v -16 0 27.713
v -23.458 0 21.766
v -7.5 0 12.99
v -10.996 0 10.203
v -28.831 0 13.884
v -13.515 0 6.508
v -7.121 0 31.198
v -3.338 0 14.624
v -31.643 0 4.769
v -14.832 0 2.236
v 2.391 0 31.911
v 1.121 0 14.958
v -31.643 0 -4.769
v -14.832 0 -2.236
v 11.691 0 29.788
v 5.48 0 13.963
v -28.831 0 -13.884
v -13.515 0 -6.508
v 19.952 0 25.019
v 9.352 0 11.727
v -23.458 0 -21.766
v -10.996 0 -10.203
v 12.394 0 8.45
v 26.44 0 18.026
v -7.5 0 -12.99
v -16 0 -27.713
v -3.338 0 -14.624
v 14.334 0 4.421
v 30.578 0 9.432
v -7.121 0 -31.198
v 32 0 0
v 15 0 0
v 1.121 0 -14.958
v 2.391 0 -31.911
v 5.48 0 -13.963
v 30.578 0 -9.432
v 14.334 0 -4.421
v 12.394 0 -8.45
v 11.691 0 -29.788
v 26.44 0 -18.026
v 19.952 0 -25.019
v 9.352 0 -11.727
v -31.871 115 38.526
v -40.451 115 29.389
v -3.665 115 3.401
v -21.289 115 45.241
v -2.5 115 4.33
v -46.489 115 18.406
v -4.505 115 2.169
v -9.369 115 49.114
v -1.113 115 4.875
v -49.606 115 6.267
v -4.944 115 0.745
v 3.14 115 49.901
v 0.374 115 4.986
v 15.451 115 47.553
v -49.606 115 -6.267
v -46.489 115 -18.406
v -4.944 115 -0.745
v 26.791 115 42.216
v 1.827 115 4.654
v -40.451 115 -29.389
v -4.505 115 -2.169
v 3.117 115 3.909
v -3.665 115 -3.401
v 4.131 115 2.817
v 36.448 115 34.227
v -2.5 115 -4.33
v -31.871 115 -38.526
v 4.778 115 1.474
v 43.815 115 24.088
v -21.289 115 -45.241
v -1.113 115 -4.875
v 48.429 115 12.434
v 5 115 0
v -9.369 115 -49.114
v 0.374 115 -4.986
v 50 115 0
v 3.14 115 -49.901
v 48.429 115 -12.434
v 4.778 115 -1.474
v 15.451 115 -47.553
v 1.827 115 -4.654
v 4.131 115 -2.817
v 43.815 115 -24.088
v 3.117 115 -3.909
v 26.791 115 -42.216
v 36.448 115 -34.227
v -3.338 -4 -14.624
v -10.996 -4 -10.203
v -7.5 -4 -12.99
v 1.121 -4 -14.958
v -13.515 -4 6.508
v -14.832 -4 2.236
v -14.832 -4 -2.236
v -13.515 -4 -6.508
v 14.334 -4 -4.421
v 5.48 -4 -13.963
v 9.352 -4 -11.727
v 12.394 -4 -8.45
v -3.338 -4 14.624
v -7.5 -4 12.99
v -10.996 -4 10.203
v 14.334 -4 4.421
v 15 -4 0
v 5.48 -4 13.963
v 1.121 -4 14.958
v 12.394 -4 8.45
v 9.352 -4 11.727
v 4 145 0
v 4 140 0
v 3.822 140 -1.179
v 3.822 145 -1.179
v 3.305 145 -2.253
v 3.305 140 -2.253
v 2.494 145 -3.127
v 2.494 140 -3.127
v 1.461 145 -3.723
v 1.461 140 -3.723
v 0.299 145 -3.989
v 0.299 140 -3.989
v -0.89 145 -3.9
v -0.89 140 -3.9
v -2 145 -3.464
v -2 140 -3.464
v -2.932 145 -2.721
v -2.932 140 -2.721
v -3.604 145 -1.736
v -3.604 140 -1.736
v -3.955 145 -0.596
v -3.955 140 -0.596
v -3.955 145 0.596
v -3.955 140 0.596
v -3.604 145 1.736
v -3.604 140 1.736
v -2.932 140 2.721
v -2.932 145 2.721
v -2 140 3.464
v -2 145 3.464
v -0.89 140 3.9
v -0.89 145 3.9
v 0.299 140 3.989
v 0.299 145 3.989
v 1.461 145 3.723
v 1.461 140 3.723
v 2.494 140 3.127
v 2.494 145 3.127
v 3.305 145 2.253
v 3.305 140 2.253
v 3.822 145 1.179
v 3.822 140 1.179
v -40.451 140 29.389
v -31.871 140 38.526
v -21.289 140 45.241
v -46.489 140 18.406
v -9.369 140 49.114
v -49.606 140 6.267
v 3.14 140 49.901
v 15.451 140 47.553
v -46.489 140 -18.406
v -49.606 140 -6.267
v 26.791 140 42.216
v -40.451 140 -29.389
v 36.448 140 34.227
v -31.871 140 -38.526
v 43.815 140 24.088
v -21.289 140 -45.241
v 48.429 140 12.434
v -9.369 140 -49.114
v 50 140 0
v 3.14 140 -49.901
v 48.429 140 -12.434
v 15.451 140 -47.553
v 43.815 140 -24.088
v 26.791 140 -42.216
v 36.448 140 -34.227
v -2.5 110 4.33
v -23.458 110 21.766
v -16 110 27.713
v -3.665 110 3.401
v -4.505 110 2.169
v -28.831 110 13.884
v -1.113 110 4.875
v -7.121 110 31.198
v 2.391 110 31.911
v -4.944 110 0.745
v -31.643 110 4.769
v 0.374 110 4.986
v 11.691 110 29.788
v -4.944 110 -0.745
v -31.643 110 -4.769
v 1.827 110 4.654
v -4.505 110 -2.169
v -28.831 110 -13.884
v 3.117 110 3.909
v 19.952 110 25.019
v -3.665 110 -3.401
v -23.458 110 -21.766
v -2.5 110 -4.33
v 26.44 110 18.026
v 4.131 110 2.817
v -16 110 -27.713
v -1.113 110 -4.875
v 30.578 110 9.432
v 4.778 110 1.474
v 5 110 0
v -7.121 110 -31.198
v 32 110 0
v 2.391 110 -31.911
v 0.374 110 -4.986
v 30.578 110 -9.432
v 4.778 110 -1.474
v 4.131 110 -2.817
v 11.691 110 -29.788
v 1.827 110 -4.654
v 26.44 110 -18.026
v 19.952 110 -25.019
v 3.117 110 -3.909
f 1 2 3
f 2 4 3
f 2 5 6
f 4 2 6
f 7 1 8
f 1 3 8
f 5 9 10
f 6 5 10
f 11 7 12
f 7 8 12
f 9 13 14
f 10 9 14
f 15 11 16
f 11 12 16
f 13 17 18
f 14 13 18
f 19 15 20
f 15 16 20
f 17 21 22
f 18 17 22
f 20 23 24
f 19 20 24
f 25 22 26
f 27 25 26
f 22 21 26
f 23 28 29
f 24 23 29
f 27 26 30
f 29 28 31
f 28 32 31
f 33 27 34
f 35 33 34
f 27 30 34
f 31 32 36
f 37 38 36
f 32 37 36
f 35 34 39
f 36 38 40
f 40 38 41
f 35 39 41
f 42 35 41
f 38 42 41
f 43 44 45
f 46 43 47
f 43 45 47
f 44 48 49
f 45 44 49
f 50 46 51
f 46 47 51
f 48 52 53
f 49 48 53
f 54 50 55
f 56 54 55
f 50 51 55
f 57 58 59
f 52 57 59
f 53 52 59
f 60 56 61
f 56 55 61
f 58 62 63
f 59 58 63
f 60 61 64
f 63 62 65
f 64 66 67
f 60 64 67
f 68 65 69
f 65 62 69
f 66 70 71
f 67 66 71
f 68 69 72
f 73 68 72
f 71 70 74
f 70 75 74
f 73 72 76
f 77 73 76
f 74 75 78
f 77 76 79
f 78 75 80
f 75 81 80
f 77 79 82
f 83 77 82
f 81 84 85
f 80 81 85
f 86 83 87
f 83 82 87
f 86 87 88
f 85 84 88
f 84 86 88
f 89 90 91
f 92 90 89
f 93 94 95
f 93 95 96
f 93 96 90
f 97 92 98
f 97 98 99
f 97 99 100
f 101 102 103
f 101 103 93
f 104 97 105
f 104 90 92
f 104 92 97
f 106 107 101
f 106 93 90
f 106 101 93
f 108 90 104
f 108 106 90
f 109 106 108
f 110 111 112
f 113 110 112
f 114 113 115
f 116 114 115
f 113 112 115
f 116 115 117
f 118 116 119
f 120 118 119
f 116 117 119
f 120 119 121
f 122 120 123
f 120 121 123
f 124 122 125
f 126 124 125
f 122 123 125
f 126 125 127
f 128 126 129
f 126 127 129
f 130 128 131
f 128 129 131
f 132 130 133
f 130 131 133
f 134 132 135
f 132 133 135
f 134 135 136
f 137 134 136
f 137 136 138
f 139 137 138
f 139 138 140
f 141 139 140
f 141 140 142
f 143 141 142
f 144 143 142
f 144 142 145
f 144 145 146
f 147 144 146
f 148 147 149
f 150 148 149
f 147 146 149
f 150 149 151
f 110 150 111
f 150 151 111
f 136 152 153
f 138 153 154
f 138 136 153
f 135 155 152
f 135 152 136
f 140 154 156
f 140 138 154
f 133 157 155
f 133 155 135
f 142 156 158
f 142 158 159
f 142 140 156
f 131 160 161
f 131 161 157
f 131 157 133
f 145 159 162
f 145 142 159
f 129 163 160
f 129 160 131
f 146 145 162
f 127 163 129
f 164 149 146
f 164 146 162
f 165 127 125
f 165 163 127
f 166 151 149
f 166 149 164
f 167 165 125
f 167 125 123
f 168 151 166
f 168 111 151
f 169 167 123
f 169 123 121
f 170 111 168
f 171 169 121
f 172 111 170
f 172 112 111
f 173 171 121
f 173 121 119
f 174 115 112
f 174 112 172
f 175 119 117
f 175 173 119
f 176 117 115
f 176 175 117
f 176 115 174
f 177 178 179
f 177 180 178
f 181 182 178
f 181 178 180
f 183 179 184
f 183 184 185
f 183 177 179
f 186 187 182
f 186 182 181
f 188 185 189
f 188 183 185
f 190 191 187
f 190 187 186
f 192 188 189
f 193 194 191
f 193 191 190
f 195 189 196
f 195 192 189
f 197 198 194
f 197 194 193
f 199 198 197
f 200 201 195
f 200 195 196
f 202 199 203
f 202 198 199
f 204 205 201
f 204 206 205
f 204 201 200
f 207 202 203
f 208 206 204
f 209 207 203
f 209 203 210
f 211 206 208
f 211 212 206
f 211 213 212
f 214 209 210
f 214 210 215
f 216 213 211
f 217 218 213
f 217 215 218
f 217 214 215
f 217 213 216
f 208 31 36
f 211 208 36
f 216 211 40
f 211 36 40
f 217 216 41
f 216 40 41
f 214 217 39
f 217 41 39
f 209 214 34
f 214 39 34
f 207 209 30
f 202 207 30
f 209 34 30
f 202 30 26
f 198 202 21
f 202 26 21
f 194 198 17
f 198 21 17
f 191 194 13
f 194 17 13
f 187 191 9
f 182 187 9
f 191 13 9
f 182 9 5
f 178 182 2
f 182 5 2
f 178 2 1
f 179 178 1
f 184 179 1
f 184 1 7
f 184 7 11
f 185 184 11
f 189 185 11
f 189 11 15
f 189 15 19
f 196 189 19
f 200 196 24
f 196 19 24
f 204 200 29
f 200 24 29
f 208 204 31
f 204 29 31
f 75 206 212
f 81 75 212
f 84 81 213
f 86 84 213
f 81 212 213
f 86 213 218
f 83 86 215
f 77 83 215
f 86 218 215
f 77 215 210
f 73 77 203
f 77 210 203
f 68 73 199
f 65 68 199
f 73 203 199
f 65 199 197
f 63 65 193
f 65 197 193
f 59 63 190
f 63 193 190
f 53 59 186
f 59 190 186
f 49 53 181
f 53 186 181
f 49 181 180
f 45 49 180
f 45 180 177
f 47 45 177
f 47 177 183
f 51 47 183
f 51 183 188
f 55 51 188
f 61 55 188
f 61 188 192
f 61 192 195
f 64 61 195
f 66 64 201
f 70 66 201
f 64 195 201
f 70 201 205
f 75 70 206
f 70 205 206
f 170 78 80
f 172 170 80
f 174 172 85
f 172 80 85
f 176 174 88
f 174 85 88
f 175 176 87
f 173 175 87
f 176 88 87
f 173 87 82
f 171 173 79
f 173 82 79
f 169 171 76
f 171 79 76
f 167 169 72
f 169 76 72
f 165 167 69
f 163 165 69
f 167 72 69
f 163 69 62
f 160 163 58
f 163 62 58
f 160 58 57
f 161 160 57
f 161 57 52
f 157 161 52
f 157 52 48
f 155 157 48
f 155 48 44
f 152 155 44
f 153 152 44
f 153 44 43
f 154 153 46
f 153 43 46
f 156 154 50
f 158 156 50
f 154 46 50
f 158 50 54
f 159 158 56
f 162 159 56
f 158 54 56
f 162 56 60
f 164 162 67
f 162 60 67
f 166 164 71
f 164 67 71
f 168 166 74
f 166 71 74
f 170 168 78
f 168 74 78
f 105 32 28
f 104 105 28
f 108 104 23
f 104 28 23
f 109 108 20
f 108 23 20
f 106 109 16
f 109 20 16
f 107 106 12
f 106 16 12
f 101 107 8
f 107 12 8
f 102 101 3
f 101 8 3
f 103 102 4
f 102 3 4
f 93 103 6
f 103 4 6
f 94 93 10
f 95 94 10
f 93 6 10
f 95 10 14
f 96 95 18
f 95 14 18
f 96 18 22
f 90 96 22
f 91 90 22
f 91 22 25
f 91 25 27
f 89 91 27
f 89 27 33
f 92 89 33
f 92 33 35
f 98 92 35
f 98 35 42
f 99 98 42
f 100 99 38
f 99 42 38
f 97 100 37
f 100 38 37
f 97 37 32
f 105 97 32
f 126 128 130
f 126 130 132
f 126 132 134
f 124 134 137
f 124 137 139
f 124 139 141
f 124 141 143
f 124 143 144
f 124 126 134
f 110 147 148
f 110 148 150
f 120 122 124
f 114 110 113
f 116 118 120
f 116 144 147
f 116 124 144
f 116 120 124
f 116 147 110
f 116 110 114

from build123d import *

# Parameters (mm, degrees)
SKETCH1_R           = 32
BOSS_EXTRUDE1_DEPTH = 110
SKETCH2_R           = 5
BOSS_EXTRUDE2_DEPTH = 5
SKETCH3_R           = 50
BOSS_EXTRUDE3_DEPTH = 25
SKETCH4_R           = 4
BOSS_EXTRUDE4_DEPTH = 5
SKETCH5_R           = 15
BOSS_EXTRUDE5_DEPTH = 4


with BuildPart() as part:
    # Sketch1 → Boss-Extrude1 (new body)
    with BuildSketch(Plane(origin=(0, 0, 0), x_dir=(1, 0, 0), z_dir=(0, 1, 0))):
        Circle(SKETCH1_R)
    extrude(amount=BOSS_EXTRUDE1_DEPTH)

    # Sketch2 → Boss-Extrude2 (add)
    with BuildSketch(Plane(origin=(0, 110, 0), x_dir=(1, 0, 0), z_dir=(0, 1, 0))):
        Circle(SKETCH2_R)
    extrude(amount=BOSS_EXTRUDE2_DEPTH)

    # Sketch3 → Boss-Extrude3 (add)
    with BuildSketch(Plane(origin=(0, 115, 0), x_dir=(1, 0, 0), z_dir=(0, 1, 0))):
        Circle(SKETCH3_R)
    extrude(amount=BOSS_EXTRUDE3_DEPTH)

    # Sketch4 → Boss-Extrude4 (add)
    with BuildSketch(Plane(origin=(0, 140, 0), x_dir=(1, 0, 0), z_dir=(0, 1, 0))):
        Circle(SKETCH4_R)
    extrude(amount=BOSS_EXTRUDE4_DEPTH)

    # Sketch5 → Boss-Extrude5 (add)
    with BuildSketch(Plane.XZ):
        Circle(SKETCH5_R)
    extrude(amount=BOSS_EXTRUDE5_DEPTH)


solid = part.part
